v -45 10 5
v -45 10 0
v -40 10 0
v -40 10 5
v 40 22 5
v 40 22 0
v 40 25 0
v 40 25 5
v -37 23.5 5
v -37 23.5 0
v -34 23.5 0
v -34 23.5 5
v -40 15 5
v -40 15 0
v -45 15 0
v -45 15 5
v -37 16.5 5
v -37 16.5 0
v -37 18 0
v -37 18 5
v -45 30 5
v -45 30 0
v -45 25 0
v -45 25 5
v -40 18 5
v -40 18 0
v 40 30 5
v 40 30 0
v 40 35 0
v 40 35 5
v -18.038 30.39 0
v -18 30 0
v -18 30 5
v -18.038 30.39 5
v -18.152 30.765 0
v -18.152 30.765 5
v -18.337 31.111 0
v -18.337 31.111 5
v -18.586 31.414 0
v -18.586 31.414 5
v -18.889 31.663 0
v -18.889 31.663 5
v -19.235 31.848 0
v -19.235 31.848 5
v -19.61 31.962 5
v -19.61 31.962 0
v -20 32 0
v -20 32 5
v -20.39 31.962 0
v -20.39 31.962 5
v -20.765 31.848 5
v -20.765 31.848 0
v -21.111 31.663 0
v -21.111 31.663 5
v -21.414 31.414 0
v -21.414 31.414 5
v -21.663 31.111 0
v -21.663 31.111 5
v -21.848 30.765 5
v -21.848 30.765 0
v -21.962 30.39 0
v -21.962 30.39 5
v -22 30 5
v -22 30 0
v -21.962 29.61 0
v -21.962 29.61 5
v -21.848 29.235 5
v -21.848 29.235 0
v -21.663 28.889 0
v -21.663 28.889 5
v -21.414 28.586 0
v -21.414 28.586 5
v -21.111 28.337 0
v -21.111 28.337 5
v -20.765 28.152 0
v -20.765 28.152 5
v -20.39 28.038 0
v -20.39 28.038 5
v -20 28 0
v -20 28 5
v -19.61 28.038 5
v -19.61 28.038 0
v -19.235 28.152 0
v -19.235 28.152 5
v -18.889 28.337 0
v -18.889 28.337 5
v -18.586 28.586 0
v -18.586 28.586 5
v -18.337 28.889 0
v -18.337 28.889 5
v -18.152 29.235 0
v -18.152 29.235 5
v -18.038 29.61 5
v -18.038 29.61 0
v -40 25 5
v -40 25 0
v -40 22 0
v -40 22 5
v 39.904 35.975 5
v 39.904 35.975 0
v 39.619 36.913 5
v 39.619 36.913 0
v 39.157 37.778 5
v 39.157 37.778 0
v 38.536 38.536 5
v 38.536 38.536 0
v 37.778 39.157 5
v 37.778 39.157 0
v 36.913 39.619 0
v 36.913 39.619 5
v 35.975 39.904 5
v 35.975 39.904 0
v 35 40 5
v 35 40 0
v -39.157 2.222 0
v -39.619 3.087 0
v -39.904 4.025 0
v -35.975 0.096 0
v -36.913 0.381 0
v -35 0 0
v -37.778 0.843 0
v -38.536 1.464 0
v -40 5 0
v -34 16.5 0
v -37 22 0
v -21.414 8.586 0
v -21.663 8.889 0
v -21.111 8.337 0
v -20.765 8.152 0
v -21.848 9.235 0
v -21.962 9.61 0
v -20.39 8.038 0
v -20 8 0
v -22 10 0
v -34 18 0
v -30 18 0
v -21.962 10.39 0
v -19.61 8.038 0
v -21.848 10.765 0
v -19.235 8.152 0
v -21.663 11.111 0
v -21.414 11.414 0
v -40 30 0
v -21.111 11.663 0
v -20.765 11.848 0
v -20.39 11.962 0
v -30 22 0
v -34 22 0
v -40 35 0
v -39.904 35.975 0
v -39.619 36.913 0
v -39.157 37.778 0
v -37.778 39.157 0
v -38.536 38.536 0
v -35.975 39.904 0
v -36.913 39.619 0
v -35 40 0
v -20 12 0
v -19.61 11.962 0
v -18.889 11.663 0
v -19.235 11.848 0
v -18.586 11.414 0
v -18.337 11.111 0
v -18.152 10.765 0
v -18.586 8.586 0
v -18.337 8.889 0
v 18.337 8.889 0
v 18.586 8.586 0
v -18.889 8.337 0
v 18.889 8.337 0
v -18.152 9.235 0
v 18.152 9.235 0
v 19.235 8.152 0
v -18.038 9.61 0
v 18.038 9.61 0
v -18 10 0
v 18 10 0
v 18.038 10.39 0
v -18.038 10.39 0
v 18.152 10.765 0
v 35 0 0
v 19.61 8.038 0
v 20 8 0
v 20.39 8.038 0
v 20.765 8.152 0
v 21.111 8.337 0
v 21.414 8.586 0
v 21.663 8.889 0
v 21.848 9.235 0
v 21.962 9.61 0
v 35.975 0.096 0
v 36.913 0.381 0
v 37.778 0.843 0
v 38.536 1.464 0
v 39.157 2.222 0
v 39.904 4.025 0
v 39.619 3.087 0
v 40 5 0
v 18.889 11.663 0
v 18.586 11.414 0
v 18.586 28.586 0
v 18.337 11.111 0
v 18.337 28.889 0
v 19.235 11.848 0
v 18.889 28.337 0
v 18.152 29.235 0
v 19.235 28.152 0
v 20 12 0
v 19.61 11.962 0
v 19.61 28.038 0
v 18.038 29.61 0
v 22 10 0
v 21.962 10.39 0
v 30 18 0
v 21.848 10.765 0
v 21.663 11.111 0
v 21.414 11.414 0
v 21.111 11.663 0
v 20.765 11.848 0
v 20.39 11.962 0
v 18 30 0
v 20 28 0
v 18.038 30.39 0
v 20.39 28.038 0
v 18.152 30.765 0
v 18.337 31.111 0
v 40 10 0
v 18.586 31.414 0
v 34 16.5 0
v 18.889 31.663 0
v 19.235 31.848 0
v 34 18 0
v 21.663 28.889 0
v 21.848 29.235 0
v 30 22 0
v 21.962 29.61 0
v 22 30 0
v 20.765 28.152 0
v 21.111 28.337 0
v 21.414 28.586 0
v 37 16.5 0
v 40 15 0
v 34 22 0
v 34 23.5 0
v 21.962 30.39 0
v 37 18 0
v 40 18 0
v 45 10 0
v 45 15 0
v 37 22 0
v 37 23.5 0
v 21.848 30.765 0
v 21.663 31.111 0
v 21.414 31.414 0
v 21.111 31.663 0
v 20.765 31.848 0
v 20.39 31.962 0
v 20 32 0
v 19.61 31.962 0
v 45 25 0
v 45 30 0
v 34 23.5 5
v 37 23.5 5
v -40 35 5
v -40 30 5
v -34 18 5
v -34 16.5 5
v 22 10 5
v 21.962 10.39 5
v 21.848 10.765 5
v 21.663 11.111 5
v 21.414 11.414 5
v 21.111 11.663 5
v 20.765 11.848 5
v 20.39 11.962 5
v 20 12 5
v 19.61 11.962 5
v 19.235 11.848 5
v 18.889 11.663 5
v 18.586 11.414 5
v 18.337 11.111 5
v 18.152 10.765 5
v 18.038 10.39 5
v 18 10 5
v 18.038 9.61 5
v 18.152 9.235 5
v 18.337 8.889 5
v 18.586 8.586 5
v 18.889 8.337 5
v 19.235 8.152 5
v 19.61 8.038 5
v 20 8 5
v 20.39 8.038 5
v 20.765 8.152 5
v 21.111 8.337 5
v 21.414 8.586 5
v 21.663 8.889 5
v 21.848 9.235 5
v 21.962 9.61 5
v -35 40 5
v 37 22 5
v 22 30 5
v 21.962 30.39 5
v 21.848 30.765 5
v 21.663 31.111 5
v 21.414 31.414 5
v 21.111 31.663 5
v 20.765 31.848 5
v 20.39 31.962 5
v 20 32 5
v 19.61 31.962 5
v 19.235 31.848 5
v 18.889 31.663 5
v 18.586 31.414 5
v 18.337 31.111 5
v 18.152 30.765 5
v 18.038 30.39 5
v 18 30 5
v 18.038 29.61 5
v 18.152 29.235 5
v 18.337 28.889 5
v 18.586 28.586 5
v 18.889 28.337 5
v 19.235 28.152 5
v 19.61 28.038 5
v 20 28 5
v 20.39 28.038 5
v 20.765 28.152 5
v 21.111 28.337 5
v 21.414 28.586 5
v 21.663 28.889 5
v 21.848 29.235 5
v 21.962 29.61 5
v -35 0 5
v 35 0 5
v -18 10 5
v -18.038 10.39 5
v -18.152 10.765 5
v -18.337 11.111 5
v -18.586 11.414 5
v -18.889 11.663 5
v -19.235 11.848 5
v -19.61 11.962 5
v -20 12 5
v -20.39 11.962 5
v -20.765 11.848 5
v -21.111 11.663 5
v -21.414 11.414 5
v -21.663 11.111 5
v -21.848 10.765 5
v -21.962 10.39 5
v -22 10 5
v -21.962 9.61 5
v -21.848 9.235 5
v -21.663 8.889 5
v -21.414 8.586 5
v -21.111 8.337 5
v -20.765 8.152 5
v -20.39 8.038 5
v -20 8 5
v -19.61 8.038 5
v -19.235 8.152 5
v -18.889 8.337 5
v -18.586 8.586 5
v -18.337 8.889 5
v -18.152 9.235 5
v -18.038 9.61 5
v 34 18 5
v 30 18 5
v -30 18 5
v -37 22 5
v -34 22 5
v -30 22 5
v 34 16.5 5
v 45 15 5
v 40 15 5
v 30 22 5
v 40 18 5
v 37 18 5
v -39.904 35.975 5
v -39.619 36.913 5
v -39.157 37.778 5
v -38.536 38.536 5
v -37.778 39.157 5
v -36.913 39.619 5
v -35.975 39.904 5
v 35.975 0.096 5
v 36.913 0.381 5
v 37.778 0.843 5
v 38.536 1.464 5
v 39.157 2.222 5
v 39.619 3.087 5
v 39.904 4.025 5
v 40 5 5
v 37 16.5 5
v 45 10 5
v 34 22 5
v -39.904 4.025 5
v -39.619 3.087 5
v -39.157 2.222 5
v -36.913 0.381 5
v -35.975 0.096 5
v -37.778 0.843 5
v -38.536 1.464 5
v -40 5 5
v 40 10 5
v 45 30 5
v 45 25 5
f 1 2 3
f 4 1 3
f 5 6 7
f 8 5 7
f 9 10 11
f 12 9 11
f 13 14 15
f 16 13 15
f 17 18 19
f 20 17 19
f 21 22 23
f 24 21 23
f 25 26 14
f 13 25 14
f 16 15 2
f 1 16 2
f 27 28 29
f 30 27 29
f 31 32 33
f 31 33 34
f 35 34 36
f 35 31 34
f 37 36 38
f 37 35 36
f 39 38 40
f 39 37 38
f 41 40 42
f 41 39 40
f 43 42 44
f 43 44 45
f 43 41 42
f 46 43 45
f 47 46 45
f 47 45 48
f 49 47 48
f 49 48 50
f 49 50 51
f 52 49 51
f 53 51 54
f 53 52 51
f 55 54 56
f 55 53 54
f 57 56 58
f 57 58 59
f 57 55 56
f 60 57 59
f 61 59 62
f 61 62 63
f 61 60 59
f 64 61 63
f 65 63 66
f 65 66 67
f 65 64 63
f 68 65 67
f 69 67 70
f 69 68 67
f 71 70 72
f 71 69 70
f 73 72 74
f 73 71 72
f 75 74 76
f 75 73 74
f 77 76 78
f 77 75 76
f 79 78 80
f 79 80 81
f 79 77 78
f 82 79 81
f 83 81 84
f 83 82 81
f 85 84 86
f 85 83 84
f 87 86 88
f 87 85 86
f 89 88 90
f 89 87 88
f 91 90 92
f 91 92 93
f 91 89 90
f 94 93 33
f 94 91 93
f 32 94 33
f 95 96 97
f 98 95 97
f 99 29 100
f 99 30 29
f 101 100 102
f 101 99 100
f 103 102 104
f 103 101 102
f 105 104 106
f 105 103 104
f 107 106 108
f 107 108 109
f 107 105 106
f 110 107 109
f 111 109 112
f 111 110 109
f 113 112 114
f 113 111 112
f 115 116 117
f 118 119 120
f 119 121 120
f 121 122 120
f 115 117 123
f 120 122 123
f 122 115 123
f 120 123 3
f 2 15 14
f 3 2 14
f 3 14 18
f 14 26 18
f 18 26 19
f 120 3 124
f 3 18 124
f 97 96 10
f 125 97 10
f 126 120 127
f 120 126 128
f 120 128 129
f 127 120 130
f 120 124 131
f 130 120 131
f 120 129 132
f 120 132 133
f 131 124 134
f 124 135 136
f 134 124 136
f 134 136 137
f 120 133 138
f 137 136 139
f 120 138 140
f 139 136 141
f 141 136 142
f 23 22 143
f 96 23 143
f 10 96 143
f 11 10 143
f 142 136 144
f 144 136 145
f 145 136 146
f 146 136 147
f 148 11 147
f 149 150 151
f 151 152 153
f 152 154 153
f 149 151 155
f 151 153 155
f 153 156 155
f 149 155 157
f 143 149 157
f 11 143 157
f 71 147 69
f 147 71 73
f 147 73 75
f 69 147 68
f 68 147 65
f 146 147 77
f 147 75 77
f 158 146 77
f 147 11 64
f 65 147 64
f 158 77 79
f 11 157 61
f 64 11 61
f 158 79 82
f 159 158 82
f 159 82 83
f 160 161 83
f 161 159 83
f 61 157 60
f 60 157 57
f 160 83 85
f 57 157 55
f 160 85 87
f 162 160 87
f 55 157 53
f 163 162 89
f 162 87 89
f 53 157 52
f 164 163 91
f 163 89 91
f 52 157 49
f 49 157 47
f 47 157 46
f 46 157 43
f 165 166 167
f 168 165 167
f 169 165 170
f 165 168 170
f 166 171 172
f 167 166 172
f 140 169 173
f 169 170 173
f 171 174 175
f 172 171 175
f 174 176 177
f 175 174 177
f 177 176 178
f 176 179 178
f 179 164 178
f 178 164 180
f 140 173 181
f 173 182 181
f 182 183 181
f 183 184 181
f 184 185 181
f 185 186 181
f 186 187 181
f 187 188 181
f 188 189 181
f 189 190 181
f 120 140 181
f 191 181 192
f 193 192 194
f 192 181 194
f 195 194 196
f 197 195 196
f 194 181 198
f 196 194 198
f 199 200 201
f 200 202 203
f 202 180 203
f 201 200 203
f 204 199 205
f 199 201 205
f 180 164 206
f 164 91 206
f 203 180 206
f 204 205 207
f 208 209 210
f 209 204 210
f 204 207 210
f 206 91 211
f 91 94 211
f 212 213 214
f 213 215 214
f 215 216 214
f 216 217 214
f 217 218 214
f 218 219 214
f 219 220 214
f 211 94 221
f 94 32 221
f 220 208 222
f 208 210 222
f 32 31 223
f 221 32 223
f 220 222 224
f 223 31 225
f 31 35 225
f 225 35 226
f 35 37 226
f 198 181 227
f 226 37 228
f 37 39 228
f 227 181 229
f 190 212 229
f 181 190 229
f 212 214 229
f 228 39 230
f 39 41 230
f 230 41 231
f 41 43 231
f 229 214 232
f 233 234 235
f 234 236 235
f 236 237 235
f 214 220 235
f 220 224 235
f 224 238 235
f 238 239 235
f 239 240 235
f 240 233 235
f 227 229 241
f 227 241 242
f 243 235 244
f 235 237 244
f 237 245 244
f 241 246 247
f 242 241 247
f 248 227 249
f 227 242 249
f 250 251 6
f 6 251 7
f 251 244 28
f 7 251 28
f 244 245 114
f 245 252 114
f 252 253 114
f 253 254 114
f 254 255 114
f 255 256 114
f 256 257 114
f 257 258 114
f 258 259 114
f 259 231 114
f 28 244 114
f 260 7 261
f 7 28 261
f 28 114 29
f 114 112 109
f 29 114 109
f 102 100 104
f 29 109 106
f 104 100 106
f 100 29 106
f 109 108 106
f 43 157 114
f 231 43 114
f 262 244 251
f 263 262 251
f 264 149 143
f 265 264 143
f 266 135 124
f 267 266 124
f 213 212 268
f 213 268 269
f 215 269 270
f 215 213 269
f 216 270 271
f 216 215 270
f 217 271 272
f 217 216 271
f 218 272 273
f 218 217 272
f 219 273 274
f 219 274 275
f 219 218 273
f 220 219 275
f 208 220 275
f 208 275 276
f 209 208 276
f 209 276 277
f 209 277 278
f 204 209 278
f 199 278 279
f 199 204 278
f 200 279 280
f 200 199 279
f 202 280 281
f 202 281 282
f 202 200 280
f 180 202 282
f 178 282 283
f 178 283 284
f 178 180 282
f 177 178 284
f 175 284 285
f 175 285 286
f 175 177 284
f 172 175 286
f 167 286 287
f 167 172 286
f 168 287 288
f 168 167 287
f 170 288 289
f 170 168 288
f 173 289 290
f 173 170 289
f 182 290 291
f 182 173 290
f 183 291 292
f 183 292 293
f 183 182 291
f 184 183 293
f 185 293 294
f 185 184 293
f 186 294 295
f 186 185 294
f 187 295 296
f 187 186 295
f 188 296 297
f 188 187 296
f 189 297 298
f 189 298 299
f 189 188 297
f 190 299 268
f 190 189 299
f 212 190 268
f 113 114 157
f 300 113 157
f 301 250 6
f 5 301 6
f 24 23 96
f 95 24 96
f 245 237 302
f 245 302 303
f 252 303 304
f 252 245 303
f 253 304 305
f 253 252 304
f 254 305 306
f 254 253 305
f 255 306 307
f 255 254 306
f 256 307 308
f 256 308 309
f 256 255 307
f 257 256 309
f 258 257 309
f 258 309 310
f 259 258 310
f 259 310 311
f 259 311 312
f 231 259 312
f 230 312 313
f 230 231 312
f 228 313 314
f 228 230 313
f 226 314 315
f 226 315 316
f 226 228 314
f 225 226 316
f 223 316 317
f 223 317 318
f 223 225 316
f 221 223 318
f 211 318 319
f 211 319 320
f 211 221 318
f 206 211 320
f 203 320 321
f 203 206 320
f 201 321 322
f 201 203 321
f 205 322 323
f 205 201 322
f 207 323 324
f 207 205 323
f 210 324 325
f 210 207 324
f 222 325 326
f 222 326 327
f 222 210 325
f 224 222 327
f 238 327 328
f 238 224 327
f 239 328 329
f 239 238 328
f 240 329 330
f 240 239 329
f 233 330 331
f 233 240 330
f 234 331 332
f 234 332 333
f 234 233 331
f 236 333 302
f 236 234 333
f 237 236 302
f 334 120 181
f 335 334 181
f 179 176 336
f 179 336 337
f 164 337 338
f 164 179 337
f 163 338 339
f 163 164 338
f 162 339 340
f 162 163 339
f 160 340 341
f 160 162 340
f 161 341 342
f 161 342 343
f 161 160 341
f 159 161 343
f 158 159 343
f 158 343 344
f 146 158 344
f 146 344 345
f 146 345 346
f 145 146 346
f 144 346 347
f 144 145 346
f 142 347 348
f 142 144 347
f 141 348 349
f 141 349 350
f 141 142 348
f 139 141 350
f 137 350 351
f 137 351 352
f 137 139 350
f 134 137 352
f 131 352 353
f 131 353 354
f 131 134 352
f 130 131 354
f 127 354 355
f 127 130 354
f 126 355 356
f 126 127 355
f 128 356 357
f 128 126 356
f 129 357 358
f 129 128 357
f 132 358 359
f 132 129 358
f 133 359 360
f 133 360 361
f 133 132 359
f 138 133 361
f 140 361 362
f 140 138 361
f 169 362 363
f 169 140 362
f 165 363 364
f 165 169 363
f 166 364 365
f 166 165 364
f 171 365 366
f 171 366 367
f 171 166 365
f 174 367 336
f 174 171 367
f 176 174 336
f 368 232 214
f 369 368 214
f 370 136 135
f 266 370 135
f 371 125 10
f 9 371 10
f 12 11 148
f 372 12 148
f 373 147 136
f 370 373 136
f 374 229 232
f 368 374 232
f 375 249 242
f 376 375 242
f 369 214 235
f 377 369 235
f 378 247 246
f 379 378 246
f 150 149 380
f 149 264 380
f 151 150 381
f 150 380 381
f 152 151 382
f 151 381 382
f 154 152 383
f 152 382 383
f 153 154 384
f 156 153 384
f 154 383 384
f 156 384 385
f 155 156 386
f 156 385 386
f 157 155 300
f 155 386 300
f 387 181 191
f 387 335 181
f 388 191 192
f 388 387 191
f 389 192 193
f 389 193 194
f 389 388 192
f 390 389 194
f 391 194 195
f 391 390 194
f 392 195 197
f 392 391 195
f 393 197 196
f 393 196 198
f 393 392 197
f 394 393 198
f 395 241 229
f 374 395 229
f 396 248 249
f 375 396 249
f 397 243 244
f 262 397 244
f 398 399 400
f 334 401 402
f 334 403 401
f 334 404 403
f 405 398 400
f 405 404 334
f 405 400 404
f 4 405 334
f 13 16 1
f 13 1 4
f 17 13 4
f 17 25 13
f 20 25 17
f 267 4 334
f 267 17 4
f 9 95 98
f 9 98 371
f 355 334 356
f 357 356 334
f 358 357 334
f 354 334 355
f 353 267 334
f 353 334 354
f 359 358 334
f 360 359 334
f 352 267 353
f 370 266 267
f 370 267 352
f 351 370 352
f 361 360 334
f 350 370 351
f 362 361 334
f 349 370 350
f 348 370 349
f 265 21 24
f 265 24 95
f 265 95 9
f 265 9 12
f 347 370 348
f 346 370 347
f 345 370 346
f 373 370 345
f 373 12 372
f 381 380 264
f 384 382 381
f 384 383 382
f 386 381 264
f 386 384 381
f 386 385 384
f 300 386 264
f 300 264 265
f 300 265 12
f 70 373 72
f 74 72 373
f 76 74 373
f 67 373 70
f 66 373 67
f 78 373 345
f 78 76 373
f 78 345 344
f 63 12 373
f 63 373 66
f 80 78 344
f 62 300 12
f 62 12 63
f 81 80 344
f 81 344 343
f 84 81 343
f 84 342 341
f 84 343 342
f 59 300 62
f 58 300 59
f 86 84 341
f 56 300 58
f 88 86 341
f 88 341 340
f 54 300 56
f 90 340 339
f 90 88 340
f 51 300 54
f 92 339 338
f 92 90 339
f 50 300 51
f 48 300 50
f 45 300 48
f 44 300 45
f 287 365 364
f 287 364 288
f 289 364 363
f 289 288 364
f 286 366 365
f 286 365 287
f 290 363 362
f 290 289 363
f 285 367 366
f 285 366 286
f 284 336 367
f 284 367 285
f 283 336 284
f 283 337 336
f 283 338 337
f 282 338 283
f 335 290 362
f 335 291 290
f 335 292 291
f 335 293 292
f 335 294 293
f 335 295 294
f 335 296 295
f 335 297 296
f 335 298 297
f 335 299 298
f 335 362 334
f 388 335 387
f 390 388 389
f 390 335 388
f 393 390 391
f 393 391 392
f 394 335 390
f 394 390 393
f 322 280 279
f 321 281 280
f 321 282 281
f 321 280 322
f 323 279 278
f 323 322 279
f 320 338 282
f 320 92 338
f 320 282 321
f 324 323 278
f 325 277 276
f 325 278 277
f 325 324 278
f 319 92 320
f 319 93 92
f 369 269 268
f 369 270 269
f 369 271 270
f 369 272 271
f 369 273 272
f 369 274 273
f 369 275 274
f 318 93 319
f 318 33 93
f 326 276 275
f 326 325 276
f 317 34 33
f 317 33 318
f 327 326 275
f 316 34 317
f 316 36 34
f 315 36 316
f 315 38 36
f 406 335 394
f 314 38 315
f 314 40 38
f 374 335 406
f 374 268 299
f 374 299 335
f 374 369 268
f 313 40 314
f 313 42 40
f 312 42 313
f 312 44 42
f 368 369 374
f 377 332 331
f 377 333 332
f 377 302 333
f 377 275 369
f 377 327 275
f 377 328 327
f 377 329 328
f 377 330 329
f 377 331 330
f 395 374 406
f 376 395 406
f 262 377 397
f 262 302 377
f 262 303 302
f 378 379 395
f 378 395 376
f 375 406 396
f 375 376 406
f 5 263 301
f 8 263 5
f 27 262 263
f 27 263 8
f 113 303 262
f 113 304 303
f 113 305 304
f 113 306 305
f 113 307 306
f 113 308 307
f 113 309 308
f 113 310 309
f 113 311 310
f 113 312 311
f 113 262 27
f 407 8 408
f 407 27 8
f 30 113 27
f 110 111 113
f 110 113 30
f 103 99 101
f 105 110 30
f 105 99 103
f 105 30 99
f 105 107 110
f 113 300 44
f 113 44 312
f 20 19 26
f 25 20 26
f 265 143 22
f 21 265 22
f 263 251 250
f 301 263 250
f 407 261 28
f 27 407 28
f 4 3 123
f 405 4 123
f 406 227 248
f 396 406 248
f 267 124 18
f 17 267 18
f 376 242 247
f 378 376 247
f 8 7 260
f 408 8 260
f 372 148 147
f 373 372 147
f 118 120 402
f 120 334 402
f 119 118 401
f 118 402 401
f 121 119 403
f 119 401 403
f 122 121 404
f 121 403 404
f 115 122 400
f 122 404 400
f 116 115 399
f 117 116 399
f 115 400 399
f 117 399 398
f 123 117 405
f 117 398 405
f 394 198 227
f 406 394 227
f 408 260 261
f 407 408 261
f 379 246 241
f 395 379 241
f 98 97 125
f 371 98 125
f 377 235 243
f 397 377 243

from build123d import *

# Parameters (mm, degrees)
ESQUISSE1_R        = 2
BOSS_EXTRU_1_DEPTH = 5
CONG_1_R           = 5


with BuildPart() as part:
    # Esquisse1 → Boss.-Extru.1 (new body)
    with BuildSketch(Plane.XY):
        Polygon((-40, 0), (40, 0), (40, 10), (45, 10), (45, 15), (40, 15), (40, 18), (37, 18), (37, 16.5), (34, 16.5), (34, 18), (30, 18), (30, 22), (34, 22), (34, 23.5), (37, 23.5), (37, 22), (40, 22), (40, 25), (45, 25), (45, 30), (40, 30), (40, 40), (-40, 40), (-40, 30), (-45, 30), (-45, 25), (-40, 25), (-40, 22), (-37, 22), (-37, 23.5), (-34, 23.5), (-34, 22), (-30, 22), (-30, 18), (-34, 18), (-34, 16.5), (-37, 16.5), (-37, 18), (-40, 18), (-40, 15), (-45, 15), (-45, 10), (-40, 10), align=None)
        with Locations((20, 30)):
            Circle(ESQUISSE1_R, mode=Mode.SUBTRACT)
        with Locations((-20, 30)):
            Circle(ESQUISSE1_R, mode=Mode.SUBTRACT)
        with Locations((-20, 10)):
            Circle(ESQUISSE1_R, mode=Mode.SUBTRACT)
        with Locations((20, 10)):
            Circle(ESQUISSE1_R, mode=Mode.SUBTRACT)
    extrude(amount=BOSS_EXTRU_1_DEPTH)

    # Congé1
    cong_1_edges = [part.edges().sort_by_distance(p)[0] for p in [
        (40, 0, 2.5),
        (-40, 0, 2.5),
        (-40, 40, 2.5),
        (40, 40, 2.5),
    ]]
    fillet(cong_1_edges, radius=CONG_1_R)


solid = part.part
